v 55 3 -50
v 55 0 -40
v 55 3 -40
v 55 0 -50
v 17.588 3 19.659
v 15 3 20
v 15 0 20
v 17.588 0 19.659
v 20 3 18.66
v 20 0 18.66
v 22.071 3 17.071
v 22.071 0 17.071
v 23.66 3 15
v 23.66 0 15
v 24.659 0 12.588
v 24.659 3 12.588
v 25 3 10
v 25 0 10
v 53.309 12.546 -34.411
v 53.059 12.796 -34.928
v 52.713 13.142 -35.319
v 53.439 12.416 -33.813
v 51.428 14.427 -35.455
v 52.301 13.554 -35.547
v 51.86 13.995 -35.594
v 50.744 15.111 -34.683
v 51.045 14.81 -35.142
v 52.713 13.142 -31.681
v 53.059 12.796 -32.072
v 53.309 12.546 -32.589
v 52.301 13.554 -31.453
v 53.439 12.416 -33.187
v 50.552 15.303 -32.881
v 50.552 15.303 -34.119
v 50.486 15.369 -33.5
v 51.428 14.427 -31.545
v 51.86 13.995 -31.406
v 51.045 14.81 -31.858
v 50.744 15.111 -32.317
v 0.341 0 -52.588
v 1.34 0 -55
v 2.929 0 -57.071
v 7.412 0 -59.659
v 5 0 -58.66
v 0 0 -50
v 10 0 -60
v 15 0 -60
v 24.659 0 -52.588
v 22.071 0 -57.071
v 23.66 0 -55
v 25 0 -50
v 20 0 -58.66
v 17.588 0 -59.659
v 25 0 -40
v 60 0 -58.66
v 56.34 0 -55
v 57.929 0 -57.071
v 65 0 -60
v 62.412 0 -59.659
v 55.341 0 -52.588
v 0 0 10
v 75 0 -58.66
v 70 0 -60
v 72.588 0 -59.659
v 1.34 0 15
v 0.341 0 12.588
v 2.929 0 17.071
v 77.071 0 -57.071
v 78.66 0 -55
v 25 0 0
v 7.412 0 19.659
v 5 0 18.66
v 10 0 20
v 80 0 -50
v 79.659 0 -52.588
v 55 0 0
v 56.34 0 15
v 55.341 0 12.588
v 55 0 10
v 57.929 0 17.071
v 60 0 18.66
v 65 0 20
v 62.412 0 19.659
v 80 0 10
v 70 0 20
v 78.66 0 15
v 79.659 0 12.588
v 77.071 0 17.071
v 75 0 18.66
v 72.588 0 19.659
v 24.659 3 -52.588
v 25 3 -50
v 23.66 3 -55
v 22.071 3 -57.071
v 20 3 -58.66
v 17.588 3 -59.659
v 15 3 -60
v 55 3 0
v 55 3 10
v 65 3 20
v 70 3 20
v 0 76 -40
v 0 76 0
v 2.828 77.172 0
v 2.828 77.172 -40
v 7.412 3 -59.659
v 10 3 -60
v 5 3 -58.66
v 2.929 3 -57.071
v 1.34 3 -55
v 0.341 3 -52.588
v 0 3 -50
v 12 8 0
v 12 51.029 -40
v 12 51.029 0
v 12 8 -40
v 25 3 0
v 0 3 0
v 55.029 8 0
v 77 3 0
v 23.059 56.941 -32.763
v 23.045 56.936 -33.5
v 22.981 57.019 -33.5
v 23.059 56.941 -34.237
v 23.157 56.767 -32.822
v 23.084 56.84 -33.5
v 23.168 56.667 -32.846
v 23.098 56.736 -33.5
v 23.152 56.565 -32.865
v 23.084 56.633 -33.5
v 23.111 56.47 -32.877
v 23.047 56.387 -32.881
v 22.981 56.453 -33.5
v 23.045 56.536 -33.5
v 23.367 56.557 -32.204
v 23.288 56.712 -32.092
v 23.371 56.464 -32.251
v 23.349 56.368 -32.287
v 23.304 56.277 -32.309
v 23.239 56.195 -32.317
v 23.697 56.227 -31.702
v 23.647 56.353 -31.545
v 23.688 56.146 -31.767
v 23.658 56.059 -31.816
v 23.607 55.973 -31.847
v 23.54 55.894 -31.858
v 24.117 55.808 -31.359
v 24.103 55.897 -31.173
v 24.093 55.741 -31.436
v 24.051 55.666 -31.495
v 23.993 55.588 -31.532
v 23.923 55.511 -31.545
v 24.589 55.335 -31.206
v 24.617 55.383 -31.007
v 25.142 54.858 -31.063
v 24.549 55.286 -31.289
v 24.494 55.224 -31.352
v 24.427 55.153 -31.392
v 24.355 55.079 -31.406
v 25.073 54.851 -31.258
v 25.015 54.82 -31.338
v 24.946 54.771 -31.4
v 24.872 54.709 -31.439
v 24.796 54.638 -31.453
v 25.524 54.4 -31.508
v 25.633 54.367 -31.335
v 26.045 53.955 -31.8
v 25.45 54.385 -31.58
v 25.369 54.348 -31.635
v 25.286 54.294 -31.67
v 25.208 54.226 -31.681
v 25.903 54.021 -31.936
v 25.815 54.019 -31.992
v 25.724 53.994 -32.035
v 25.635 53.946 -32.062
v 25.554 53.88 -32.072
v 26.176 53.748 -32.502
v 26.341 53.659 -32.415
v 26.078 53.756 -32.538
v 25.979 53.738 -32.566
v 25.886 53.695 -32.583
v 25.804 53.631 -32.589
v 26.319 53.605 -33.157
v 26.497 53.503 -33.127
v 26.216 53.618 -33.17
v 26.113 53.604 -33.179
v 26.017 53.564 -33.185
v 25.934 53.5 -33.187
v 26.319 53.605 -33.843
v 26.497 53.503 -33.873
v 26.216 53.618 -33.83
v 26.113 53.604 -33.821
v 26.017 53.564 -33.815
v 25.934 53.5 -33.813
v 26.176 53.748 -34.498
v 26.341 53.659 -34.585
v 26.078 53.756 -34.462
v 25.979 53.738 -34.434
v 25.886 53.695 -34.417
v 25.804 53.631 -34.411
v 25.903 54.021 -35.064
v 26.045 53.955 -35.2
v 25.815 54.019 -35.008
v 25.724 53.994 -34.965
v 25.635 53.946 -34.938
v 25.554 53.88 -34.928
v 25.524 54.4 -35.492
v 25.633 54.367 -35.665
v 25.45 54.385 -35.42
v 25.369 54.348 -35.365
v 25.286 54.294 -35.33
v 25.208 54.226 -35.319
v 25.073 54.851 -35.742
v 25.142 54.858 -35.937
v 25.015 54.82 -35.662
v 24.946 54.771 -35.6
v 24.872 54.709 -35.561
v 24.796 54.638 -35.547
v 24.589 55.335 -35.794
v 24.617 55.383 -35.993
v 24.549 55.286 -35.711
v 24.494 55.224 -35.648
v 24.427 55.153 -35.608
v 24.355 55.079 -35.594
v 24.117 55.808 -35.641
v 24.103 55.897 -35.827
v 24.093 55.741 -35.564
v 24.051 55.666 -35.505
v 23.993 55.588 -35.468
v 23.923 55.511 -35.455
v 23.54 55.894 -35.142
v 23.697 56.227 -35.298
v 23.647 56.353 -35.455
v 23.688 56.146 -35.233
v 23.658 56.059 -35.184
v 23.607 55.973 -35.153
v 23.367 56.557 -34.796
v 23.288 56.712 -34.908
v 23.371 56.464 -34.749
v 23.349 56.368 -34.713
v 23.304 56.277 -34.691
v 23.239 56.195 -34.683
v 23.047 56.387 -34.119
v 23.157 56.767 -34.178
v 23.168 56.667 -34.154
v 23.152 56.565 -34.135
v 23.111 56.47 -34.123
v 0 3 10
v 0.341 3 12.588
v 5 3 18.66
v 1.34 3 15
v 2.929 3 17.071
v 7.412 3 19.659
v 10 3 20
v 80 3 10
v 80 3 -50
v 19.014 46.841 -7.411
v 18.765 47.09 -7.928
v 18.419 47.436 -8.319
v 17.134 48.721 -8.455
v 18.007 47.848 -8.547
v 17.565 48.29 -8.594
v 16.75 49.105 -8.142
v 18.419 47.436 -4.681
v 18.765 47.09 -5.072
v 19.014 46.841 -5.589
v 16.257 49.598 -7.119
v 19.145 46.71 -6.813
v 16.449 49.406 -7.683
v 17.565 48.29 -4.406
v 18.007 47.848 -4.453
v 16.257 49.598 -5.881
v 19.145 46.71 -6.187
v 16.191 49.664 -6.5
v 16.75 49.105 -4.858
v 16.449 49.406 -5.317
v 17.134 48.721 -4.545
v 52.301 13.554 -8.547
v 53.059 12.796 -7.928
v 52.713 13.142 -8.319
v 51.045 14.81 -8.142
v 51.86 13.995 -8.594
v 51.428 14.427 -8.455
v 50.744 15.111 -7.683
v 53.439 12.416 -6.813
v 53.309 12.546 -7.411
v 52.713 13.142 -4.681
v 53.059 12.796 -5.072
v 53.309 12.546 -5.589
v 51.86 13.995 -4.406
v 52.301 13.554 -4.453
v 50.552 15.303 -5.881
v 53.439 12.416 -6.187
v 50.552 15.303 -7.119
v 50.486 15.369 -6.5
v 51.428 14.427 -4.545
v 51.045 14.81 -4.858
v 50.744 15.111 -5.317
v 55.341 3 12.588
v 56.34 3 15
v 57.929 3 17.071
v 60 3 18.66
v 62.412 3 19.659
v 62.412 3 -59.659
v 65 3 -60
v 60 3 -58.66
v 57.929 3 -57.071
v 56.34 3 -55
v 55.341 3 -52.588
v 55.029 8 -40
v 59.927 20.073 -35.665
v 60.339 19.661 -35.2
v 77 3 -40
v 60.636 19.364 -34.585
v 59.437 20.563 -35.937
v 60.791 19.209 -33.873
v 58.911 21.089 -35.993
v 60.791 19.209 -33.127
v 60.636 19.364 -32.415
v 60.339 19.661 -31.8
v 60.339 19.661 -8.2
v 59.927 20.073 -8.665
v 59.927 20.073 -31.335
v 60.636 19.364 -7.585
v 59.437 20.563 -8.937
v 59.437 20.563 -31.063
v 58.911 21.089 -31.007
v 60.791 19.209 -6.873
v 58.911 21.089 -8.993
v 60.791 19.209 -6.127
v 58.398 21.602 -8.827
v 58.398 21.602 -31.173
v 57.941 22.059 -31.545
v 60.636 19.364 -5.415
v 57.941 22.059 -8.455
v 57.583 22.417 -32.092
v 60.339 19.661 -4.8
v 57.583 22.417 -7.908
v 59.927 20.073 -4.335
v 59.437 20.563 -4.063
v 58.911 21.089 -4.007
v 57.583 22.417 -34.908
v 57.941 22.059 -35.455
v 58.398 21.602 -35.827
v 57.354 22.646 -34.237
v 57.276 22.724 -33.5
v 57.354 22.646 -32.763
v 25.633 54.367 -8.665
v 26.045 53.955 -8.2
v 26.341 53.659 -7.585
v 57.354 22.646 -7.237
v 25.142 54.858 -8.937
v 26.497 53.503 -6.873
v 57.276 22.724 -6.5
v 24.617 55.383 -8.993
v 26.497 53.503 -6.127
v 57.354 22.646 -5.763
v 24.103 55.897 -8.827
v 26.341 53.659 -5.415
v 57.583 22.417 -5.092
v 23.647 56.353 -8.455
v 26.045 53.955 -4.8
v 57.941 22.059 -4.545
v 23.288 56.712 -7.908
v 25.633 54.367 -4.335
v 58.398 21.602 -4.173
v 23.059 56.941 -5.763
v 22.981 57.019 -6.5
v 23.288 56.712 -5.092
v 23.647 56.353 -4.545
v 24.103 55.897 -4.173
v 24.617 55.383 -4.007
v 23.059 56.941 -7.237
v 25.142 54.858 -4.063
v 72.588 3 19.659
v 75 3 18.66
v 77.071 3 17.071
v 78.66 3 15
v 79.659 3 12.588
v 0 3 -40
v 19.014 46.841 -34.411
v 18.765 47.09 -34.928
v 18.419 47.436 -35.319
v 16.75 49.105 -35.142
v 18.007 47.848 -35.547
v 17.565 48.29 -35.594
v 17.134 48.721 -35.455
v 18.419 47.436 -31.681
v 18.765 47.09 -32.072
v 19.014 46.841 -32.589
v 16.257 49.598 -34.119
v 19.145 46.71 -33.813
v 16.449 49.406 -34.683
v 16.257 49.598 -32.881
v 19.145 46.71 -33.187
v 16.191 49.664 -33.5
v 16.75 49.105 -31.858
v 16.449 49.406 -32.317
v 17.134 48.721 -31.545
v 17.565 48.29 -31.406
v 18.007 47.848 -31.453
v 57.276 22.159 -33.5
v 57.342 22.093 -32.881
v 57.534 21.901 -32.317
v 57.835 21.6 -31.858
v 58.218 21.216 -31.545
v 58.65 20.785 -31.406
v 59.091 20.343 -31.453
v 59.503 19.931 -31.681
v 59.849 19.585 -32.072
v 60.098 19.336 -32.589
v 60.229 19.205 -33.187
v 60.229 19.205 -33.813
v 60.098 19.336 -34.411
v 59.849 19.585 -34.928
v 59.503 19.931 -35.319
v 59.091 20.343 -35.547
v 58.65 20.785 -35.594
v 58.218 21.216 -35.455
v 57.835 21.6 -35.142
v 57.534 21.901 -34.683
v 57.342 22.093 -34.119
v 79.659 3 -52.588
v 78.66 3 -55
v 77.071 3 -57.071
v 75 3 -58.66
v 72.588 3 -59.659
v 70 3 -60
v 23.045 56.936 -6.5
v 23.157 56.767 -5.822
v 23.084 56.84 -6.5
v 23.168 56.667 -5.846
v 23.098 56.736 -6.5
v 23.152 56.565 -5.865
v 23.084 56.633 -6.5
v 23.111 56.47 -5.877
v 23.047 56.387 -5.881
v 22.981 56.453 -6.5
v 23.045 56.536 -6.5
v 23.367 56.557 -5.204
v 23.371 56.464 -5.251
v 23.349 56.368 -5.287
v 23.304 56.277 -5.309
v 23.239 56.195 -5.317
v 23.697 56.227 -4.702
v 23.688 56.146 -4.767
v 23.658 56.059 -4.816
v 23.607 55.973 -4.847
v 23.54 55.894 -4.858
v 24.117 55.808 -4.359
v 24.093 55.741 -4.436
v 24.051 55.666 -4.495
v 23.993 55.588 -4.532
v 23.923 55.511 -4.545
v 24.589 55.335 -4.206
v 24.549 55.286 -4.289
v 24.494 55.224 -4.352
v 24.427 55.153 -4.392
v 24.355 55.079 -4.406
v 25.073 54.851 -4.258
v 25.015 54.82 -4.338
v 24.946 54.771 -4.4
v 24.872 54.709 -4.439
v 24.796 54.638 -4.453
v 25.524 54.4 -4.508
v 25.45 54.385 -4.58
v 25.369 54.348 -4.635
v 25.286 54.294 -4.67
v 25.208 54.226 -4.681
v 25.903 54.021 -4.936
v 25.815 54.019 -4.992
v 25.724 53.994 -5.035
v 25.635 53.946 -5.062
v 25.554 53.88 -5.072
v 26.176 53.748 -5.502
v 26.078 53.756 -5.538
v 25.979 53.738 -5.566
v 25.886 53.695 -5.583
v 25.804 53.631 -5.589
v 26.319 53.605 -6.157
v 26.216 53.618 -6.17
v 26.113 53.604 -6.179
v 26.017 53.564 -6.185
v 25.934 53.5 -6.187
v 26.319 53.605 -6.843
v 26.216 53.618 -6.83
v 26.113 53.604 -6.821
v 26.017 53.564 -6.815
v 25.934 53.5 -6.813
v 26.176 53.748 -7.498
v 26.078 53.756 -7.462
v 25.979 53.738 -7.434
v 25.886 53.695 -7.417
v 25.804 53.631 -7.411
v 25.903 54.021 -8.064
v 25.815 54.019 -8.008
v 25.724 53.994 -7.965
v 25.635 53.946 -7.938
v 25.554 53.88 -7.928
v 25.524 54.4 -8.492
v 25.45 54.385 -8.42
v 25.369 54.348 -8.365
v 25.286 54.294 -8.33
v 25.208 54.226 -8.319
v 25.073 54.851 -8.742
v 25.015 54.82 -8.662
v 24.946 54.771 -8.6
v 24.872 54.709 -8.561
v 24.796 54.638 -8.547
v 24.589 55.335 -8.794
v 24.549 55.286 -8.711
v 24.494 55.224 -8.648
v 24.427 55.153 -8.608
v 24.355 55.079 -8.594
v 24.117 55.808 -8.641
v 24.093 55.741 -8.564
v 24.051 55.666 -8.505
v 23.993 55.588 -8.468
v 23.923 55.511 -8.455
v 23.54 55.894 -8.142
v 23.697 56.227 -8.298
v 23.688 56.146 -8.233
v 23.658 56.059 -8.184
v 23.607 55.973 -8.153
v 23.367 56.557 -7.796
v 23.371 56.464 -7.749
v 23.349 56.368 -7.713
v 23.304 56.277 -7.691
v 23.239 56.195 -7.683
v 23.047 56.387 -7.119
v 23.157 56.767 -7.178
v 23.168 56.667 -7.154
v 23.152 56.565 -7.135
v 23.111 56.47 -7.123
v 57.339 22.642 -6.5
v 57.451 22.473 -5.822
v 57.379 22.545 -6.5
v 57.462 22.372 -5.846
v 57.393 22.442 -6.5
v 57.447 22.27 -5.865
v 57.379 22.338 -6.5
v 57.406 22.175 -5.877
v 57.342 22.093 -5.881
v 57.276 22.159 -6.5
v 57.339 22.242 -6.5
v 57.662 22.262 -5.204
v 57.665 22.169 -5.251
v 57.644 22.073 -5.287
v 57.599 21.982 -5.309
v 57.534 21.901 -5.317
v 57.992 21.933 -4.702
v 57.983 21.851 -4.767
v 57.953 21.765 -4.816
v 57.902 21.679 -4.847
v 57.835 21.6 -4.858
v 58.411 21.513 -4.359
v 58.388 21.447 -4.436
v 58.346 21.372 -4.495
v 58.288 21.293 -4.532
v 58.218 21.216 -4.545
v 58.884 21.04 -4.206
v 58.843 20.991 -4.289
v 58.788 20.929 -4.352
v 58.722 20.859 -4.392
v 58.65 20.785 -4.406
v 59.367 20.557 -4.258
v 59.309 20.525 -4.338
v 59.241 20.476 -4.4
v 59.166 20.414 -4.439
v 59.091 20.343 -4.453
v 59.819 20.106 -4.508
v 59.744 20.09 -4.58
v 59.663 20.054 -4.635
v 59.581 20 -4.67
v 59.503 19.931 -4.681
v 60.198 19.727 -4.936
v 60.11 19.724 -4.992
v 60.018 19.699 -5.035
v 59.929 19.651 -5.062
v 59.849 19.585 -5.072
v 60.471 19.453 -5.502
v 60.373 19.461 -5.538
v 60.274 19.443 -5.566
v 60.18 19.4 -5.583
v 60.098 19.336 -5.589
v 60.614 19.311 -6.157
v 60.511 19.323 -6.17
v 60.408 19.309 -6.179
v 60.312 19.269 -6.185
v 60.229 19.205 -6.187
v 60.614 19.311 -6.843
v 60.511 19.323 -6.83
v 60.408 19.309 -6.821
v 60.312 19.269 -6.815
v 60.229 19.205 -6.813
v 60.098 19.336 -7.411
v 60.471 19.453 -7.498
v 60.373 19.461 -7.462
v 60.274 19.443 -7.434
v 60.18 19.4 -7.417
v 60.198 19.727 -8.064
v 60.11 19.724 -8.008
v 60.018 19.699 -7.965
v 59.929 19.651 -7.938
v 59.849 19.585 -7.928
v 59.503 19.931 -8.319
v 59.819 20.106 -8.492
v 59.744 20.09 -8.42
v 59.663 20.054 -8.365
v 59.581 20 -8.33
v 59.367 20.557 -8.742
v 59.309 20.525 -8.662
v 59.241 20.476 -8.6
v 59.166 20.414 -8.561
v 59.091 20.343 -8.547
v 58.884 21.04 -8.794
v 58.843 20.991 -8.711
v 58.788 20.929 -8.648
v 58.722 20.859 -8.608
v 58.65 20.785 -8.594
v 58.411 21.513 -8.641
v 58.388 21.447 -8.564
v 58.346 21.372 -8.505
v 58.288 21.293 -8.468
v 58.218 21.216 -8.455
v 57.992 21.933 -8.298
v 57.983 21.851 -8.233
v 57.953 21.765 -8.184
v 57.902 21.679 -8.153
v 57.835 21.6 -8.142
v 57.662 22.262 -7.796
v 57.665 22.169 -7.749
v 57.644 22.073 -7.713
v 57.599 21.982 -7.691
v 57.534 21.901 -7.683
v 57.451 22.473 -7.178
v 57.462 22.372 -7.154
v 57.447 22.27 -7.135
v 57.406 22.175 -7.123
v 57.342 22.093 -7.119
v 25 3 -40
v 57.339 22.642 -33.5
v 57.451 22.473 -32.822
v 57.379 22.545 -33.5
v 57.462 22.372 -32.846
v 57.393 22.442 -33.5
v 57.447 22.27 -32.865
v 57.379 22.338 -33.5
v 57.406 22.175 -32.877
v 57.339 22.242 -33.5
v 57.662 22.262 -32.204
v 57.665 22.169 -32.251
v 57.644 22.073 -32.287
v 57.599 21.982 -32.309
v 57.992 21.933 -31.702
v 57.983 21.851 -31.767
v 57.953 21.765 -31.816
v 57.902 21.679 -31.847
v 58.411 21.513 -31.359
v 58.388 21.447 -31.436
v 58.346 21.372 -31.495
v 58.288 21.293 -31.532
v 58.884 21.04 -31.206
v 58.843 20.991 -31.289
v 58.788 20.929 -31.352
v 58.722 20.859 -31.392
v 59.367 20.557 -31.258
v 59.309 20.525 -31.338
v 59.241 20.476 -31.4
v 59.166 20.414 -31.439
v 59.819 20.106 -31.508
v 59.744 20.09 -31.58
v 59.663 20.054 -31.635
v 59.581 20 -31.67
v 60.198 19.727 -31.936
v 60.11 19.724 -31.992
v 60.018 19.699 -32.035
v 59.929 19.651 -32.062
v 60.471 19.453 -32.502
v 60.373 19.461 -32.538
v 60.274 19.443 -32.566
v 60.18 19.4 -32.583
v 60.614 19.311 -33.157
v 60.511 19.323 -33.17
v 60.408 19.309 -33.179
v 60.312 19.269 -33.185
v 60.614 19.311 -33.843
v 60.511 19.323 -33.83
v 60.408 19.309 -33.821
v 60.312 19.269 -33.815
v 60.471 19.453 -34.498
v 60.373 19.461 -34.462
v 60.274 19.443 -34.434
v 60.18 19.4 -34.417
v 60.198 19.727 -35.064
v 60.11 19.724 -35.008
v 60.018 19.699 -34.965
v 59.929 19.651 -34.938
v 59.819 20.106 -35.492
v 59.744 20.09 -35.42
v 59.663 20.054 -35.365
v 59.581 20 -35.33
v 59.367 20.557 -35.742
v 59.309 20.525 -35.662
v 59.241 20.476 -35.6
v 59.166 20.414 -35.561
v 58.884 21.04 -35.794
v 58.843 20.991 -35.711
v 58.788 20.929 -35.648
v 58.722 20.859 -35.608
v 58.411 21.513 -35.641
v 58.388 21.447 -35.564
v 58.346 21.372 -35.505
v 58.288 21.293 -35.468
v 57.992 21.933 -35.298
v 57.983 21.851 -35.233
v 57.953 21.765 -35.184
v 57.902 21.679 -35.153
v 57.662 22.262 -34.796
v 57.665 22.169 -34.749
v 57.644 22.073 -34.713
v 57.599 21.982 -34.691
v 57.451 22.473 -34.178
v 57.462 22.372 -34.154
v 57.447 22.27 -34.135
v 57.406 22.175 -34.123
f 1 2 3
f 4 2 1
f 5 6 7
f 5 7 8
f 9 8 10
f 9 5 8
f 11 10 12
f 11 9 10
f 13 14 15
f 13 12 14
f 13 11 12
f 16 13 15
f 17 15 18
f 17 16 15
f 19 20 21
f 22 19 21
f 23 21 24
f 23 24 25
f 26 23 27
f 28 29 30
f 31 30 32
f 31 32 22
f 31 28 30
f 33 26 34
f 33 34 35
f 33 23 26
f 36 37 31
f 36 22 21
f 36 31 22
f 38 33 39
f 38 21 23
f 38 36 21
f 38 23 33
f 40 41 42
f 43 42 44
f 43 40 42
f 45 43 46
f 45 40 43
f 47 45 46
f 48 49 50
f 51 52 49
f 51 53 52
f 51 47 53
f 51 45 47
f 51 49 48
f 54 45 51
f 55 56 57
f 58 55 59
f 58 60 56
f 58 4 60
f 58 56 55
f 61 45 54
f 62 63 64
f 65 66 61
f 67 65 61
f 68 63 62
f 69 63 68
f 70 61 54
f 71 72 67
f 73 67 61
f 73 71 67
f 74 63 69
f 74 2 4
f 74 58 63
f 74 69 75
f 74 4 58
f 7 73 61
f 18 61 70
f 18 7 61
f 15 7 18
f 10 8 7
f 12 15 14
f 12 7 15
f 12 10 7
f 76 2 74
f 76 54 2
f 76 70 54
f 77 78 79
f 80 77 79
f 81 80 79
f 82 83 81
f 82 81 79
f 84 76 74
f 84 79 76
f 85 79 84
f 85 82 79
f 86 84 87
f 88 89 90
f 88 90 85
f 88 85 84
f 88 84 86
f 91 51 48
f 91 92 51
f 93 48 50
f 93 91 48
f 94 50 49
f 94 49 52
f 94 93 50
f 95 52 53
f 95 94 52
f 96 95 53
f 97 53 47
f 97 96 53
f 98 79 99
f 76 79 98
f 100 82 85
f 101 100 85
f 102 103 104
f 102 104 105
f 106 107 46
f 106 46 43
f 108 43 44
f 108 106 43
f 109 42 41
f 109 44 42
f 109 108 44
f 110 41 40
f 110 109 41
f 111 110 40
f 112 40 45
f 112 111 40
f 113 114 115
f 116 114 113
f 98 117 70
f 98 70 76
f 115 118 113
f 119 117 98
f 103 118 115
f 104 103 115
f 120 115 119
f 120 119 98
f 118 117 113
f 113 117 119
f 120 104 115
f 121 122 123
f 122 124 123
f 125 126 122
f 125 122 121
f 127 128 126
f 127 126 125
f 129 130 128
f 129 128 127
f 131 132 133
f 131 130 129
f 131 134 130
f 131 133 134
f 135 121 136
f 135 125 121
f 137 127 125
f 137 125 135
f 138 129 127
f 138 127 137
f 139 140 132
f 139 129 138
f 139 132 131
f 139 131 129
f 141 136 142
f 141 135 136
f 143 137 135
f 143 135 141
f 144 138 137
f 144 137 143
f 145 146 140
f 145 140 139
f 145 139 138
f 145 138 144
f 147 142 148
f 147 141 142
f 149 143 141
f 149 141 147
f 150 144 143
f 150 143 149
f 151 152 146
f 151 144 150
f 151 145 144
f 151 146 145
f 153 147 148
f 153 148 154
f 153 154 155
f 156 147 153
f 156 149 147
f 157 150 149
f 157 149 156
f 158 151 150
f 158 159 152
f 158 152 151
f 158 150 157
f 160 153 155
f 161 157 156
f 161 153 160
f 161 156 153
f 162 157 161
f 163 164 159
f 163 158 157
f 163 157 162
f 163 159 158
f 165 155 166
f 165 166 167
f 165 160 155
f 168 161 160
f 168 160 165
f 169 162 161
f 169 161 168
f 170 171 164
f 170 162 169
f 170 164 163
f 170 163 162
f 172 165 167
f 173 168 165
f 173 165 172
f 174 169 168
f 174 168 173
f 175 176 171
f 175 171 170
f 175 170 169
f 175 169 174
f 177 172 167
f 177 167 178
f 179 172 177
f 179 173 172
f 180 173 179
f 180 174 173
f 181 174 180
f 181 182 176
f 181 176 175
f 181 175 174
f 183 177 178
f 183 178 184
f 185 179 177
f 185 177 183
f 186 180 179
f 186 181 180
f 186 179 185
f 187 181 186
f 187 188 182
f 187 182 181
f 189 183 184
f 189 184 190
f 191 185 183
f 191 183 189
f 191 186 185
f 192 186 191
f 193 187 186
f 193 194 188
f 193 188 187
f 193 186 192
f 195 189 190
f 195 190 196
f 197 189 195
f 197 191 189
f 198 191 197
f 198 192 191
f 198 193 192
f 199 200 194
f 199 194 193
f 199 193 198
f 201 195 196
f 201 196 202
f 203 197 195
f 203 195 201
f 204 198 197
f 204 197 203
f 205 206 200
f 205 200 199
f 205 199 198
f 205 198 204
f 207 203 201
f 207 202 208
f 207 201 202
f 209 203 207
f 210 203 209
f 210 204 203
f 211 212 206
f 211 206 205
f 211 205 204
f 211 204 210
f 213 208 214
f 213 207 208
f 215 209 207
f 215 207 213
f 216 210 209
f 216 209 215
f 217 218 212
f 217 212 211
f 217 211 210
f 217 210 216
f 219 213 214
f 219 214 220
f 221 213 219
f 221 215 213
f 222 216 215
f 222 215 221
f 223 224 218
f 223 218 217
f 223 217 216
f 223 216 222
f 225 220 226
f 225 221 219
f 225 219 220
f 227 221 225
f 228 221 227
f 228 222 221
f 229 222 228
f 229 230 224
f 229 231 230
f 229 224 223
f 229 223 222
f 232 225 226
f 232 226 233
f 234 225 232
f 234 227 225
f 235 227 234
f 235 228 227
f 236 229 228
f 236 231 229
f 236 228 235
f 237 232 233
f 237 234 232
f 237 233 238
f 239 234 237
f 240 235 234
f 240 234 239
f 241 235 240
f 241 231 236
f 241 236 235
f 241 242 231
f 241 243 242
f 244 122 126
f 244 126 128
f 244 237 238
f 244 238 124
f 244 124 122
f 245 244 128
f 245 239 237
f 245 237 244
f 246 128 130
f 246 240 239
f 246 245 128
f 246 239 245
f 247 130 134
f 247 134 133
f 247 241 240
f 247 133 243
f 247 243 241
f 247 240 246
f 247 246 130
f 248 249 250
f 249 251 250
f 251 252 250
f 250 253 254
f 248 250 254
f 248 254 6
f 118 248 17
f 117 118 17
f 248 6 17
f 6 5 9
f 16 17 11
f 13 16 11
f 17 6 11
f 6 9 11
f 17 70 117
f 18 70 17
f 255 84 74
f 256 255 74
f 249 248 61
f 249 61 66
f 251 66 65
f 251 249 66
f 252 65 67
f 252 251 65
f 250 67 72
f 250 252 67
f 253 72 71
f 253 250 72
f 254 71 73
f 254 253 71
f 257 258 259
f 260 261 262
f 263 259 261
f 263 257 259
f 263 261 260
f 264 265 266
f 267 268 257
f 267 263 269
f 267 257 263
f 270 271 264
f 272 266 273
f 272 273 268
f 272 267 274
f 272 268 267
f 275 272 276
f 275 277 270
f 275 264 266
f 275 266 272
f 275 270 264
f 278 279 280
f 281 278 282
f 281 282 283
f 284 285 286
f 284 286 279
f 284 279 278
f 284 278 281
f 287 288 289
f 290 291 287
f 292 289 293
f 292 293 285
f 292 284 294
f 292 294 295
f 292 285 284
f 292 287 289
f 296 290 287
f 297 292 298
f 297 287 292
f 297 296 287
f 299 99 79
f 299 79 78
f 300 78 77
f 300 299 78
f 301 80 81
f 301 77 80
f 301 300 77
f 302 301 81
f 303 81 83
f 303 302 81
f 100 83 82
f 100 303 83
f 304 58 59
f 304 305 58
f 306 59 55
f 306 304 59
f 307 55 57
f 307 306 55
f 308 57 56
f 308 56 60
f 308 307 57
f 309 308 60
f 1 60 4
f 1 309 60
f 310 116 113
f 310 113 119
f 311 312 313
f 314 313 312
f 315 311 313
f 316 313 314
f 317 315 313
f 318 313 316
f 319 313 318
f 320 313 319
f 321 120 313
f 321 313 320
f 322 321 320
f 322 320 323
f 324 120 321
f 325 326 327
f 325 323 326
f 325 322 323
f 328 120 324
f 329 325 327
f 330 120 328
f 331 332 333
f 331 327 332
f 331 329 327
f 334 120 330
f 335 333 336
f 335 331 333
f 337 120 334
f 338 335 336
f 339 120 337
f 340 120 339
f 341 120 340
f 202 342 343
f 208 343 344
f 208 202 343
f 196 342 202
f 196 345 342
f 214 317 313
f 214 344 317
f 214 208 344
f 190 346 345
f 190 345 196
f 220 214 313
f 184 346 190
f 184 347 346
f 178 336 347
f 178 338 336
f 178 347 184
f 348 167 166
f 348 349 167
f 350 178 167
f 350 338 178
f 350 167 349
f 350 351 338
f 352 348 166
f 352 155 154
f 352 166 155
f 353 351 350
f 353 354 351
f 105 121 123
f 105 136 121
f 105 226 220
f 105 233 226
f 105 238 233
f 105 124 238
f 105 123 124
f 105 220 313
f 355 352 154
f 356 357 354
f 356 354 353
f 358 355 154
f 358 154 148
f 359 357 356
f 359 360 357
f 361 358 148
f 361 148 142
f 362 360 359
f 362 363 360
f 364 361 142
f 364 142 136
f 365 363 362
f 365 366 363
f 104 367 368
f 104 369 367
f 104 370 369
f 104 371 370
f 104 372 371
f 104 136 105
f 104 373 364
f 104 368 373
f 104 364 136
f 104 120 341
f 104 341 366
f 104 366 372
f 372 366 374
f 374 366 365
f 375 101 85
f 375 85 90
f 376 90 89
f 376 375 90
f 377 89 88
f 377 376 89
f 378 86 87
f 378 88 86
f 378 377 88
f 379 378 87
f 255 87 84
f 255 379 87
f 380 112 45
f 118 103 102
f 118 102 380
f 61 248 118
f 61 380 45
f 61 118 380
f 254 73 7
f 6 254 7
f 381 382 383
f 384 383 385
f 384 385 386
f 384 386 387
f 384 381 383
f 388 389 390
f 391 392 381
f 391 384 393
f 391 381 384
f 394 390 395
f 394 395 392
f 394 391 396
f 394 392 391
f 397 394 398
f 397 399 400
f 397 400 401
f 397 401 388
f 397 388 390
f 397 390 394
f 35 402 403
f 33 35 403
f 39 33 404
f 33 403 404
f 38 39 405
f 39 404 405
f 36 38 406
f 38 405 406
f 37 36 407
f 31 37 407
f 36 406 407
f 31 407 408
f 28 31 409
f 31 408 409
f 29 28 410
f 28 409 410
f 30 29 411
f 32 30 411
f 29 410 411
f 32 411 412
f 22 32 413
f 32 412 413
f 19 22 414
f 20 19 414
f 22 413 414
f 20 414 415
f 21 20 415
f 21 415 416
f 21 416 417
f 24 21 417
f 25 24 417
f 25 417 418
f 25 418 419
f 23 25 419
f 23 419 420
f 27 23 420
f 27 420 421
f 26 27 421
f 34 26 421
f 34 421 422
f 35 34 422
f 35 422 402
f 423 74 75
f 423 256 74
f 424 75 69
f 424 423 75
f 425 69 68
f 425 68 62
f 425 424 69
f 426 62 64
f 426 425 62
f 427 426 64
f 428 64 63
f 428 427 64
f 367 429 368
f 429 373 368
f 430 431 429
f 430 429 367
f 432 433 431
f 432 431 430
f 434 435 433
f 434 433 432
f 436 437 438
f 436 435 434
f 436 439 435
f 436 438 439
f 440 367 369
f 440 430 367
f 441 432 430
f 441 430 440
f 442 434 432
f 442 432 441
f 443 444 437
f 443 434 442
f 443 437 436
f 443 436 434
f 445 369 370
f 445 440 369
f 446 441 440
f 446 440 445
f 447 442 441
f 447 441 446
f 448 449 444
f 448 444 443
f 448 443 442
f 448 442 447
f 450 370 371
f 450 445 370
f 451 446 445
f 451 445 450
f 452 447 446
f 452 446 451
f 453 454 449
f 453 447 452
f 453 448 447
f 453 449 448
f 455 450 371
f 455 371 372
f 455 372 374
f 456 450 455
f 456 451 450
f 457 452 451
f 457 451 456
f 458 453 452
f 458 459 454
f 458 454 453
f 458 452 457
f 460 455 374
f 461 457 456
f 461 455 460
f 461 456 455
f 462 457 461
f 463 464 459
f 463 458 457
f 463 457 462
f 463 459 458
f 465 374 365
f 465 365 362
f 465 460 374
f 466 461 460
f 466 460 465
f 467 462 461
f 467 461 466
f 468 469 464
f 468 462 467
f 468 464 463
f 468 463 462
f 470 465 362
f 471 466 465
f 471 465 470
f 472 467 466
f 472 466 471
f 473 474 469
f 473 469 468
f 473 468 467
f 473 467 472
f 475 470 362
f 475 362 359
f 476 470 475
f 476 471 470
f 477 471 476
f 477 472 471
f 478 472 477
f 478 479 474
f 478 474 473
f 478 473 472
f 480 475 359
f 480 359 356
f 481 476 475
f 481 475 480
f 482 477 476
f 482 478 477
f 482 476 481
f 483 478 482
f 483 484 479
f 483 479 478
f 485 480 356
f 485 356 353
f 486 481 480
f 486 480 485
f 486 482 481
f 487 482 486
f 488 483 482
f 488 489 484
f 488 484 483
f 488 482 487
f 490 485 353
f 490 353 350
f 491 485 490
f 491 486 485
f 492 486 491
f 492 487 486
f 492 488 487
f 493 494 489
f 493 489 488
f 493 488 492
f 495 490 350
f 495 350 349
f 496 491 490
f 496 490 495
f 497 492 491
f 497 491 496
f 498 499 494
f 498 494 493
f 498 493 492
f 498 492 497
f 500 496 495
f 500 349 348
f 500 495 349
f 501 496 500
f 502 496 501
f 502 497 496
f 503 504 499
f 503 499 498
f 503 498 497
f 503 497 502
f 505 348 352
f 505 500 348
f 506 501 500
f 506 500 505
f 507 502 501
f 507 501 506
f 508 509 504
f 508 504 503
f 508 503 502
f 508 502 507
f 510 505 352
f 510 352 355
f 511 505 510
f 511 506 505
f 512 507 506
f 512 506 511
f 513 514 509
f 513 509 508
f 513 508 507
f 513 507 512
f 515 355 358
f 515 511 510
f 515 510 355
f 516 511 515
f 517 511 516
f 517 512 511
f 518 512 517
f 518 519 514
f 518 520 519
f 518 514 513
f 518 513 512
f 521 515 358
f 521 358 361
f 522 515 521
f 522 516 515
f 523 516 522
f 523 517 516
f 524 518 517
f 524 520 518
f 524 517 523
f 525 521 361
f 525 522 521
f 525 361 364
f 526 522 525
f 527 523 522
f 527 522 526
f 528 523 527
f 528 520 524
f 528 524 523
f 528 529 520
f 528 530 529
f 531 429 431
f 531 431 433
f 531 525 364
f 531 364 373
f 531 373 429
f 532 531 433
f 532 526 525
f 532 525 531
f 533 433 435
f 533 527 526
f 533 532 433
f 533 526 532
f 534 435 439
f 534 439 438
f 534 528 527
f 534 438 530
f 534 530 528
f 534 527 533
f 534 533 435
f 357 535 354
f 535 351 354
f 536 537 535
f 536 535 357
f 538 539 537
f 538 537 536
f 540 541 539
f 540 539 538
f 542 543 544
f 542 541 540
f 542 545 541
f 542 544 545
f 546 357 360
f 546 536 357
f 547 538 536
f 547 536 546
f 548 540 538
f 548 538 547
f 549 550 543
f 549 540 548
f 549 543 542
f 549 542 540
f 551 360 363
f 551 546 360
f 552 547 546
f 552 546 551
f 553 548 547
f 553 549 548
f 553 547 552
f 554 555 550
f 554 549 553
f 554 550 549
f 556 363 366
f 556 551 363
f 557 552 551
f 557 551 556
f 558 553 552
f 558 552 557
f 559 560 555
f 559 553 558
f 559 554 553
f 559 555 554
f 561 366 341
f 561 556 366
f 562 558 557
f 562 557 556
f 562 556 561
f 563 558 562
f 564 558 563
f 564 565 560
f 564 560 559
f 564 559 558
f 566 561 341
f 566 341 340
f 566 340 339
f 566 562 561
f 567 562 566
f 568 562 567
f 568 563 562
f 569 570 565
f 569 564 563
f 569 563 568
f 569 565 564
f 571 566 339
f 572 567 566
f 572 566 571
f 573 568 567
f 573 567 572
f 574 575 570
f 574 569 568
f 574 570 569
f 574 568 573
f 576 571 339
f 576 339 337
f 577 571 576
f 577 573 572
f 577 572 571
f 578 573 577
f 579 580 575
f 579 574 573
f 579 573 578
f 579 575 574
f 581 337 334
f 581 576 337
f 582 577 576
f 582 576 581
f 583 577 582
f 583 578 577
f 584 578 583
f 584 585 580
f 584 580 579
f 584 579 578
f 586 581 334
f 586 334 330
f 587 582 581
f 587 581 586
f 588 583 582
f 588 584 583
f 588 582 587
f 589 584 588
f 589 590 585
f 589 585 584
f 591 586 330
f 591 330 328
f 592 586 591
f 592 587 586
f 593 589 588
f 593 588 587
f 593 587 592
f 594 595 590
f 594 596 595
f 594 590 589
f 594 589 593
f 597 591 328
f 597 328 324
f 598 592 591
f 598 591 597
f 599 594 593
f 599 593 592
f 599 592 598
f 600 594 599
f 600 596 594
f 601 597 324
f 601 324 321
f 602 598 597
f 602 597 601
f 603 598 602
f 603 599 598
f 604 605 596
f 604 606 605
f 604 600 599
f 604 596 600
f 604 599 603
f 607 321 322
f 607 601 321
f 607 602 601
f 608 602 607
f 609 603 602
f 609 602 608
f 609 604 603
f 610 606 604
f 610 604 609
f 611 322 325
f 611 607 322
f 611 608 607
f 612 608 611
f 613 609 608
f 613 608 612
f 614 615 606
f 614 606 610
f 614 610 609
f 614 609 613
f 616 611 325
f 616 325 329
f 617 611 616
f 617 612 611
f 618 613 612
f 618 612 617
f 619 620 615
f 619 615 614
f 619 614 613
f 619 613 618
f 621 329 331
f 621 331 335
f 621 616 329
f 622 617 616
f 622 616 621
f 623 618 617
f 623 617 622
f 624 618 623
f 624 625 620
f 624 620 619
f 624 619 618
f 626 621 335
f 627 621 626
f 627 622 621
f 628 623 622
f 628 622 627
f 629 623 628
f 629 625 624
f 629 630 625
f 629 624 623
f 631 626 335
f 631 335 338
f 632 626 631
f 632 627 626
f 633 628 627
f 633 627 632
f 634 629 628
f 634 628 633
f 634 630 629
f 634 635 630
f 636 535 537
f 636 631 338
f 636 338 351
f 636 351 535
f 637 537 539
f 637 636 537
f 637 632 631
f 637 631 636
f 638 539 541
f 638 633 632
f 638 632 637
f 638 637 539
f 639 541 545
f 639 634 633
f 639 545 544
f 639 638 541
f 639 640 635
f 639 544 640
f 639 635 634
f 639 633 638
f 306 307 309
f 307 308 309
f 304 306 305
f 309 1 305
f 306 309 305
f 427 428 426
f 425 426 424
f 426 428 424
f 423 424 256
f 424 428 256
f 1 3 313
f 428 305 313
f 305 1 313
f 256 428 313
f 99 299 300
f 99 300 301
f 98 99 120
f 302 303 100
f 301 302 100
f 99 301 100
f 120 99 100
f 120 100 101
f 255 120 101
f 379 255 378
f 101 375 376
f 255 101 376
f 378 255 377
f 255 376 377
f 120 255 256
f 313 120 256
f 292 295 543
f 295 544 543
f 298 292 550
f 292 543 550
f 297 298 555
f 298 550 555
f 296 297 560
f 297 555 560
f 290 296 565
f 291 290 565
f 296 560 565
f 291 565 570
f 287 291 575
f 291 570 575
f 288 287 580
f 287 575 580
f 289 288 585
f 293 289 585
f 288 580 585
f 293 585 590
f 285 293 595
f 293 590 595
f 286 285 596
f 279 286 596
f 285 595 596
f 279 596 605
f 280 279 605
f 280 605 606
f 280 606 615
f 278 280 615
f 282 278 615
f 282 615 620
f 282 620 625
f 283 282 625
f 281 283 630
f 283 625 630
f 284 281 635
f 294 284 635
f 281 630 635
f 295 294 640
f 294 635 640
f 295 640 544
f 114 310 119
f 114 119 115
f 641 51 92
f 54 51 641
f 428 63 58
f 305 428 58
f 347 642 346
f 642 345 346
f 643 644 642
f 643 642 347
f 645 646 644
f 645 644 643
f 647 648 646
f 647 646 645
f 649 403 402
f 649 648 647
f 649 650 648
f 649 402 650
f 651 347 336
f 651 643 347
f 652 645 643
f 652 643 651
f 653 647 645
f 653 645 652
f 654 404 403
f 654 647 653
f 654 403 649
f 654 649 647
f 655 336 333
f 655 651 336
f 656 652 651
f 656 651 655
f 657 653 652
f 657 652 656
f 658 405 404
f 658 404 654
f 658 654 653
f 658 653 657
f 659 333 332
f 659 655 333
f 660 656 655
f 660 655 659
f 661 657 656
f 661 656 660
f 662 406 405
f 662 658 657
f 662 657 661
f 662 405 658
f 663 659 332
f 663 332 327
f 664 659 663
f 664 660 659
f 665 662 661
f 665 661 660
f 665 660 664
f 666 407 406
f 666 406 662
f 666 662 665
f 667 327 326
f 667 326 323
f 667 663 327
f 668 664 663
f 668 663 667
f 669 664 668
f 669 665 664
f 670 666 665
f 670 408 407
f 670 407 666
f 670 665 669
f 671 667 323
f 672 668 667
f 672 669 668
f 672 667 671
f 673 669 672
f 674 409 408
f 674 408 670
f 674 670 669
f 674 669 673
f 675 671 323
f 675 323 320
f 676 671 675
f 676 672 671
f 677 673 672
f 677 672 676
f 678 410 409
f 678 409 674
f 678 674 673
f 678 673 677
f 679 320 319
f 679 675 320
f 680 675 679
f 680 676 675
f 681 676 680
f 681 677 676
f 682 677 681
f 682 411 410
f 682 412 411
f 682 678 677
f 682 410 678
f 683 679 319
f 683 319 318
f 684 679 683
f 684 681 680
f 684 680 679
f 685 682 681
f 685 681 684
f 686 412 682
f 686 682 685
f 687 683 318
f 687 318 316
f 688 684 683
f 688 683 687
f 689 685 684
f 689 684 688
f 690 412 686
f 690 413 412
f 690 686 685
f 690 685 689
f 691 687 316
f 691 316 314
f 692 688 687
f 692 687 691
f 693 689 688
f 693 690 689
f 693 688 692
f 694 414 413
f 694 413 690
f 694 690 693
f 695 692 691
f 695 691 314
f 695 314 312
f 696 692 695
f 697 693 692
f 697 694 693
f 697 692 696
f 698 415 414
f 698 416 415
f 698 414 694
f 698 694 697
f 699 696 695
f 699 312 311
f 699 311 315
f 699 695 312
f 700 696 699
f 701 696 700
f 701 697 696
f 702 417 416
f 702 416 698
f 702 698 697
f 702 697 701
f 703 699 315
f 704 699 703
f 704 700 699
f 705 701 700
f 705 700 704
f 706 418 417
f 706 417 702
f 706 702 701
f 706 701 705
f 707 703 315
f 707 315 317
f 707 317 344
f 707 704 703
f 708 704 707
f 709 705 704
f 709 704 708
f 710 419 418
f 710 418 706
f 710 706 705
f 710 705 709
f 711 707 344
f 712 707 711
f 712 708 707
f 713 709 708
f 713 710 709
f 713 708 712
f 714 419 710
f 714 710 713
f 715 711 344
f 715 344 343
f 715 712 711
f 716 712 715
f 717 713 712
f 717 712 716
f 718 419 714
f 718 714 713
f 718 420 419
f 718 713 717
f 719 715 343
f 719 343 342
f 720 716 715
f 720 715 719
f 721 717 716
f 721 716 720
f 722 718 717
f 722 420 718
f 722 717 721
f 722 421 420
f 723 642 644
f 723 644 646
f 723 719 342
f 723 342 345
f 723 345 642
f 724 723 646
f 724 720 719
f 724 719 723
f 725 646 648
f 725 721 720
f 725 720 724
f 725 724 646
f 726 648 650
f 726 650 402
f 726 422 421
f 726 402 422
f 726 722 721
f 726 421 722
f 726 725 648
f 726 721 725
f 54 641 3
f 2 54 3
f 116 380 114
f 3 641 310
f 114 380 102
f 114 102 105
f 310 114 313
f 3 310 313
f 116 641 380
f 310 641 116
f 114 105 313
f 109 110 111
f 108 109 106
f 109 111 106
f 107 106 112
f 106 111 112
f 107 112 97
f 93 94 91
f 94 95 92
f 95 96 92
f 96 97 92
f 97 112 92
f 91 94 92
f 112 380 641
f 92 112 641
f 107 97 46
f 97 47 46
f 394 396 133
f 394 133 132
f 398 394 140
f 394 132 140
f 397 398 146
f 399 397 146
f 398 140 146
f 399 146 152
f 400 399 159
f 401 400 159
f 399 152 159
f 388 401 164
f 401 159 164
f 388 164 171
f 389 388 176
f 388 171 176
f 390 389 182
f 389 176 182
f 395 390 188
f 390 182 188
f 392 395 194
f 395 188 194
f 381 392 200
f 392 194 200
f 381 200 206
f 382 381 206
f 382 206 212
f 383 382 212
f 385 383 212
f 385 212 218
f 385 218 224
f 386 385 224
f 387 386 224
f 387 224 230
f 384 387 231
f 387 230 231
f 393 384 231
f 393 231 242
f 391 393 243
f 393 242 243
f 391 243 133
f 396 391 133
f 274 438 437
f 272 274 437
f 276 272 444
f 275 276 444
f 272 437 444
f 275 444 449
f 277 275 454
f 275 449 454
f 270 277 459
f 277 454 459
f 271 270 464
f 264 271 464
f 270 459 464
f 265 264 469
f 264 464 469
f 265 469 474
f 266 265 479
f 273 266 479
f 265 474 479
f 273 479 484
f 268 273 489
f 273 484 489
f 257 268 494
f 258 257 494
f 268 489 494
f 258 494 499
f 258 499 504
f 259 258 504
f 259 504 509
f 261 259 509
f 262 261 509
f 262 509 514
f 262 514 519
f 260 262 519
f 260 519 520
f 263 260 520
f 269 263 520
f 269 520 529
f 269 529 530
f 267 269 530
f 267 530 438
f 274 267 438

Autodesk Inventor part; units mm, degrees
ref_plane "YZ Plane" through (0, 0, 0) normal (1, 0, 0) x (0, 1, 0)
ref_plane "XZ Plane" through (0, 0, 0) normal (0, 1, 0) x (-1, 0, 0)
ref_plane "XY Plane" through (0, 0, 0) normal (0, 0, 1) x (1, 0, 0)
sketch "Sketch1" plane through (0, 0, 0) normal (0, 0, 1) x (1, 0, 0)
  line L0 (0, 0) -> (80, 0)
  line L1 (80, 0) -> (80, 80)
  line L2 (80, 80) -> (0, 80)
  line L3 (0, 80) -> (0, 0)
  line L4 (80, 0) -> (0, 80)
  dimension "d0" = 80
  dimension "d1" = 80
  dimension "d2" = 45
extrude "Extrusion1" add sketch "Sketch1" against normal blind 40 contours L3 L4 L0
sketch "Sketch2" plane through (80, 0, -40) normal (0.7071, 0.7071, 0) x (-0.7071, 0.7071, 0)
  circle A0 centre (78.1371, 33.5) radius 2.1
  circle A1 centre (78.1371, 6.5) radius 2.1
  line L0 (0, 40) -> (113.1371, 40) projected
  line L1 (113.1371, 0) -> (0, 0) projected
  circle A2 centre (29.6371, 33.5) radius 2.1
  circle A3 centre (29.6371, 6.5) radius 2.1
  line L2 (113.1371, 40) -> (113.1371, 0) projected
  point P0 (56.5685, 40)
  dimension "d5" = 27
  dimension "d6" = 4.2
  dimension "d7" = 4.2
  dimension "d8" = 6.5
  dimension "d10" = 27
  dimension "d11" = 4.2
  dimension "d12" = 4.2
  dimension "d13" = 48.5
  dimension "d29" = 35
  dimension "d30" = 35
  dimension "d31" = 48.5
  dimension "d32" = 6.5
extrude "Extrusion2" cut sketch "Sketch2" against normal blind 10
fillet "Fillet1" radius 0.4 4 edges at (26.2337, 53.7663, -33.5) (26.2337, 53.7663, -6.5) (60.5283, 19.4717, -6.5) (60.5283, 19.4717, -33.5)
sketch "Sketch3" plane through (0, 0, -40) normal (0, 0, -1) x (-1, 0, 0)
  line L0 (0, 80) -> (-80, 0) projected
  line L1 (0, 0) -> (0, 80) projected
  line L2 (-80, 0) -> (0, 80)
  line L3 (0, 80) -> (0, 0)
  line L4 (0, 0) -> (-80, 0)
  line L5 (-91.5147, -28.4853) -> (-12, 51.0294)
  line L6 (-12, 51.0294) -> (-12, 0)
  line L7 (-12, 8) -> (-55.0294, 8)
  dimension "d17" = 12
  dimension "d18" = 8
extrude "Extrusion3" cut sketch "Sketch3" against normal blind 40 contours L5 L6 L7
sketch "Sketch4" plane through (0, 0, 0) normal (0, -1, 0) x (1, 0, 0)
  line L0 (-20, -60) -> (80, -60)
  line L1 (80, -60) -> (80, 20)
  line L2 (80, 20) -> (-20, 20)
  line L3 (-20, 20) -> (-20, -60)
  line L4 (80, 0) -> (80, -40) projected
  line L5 (80, -40) -> (0, -40) projected
  line L6 (0, 0) -> (80, 0) projected
  line L7 (50, 20) -> (10, 20)
  line L8 (10, 20) -> (10, -60)
  line L9 (10, -60) -> (50, -60)
  line L10 (50, -60) -> (50, 20)
  point P0 (10, 0)
  point P1 (10, 20)
  point P2 (10, -40)
  point P3 (50, -40)
  point P4 (50, 0)
  dimension "d21" = 100
  dimension "d22" = 0
  dimension "d23" = 20
  dimension "d24" = 20
  dimension "d25" = 30
  dimension "d26" = 30
extrude "Extrusion4" [suppressed]
chamfer "Chamfer1" distance 4 angle 45 1 edges at (0, 80, -20)
fillet "Fillet2" [suppressed]
sketch "Sketch5" plane through (0, 0, 0) normal (0, -1, 0) x (1, 0, 0)
  line L0 (0, 20) -> (80, 20)
  line L1 (80, 20) -> (80, -60)
  line L2 (80, -60) -> (0, -60)
  line L3 (0, -60) -> (0, 20)
  line L4 (0, 0) -> (80, 0) projected
  line L5 (80, -40) -> (0, -40) projected
  line L6 (80, 0) -> (80, -40) projected
  line L7 (25, 20) -> (55, 20)
  line L8 (55, 20) -> (55, -60)
  line L9 (55, -60) -> (25, -60)
  line L10 (25, -60) -> (25, 20)
  dimension "d37" = 20
  dimension "d38" = 20
  dimension "d39" = 0
  dimension "d40" = 80
  dimension "d41" = 25
  dimension "d42" = 25
extrude "Extrusion5" add sketch "Sketch5" against normal blind 3 contours L0 L10 L4 L3 | L4 L10 L5 L3 | L0 L1 L4 L8 | L5 L10 L2 L3 | L4 L1 L5 L8 | L5 L1 L2 L8
fillet "Fillet3" radius 10 8 edges at (25, 1.5, 20) (0, 1.5, 20) (55, 1.5, 20) (80, 1.5, 20) (80, 1.5, -60) (55, 1.5, -60) (25, 1.5, -60) (0, 1.5, -60)
properties part number "Gravitational viscometer P2"
